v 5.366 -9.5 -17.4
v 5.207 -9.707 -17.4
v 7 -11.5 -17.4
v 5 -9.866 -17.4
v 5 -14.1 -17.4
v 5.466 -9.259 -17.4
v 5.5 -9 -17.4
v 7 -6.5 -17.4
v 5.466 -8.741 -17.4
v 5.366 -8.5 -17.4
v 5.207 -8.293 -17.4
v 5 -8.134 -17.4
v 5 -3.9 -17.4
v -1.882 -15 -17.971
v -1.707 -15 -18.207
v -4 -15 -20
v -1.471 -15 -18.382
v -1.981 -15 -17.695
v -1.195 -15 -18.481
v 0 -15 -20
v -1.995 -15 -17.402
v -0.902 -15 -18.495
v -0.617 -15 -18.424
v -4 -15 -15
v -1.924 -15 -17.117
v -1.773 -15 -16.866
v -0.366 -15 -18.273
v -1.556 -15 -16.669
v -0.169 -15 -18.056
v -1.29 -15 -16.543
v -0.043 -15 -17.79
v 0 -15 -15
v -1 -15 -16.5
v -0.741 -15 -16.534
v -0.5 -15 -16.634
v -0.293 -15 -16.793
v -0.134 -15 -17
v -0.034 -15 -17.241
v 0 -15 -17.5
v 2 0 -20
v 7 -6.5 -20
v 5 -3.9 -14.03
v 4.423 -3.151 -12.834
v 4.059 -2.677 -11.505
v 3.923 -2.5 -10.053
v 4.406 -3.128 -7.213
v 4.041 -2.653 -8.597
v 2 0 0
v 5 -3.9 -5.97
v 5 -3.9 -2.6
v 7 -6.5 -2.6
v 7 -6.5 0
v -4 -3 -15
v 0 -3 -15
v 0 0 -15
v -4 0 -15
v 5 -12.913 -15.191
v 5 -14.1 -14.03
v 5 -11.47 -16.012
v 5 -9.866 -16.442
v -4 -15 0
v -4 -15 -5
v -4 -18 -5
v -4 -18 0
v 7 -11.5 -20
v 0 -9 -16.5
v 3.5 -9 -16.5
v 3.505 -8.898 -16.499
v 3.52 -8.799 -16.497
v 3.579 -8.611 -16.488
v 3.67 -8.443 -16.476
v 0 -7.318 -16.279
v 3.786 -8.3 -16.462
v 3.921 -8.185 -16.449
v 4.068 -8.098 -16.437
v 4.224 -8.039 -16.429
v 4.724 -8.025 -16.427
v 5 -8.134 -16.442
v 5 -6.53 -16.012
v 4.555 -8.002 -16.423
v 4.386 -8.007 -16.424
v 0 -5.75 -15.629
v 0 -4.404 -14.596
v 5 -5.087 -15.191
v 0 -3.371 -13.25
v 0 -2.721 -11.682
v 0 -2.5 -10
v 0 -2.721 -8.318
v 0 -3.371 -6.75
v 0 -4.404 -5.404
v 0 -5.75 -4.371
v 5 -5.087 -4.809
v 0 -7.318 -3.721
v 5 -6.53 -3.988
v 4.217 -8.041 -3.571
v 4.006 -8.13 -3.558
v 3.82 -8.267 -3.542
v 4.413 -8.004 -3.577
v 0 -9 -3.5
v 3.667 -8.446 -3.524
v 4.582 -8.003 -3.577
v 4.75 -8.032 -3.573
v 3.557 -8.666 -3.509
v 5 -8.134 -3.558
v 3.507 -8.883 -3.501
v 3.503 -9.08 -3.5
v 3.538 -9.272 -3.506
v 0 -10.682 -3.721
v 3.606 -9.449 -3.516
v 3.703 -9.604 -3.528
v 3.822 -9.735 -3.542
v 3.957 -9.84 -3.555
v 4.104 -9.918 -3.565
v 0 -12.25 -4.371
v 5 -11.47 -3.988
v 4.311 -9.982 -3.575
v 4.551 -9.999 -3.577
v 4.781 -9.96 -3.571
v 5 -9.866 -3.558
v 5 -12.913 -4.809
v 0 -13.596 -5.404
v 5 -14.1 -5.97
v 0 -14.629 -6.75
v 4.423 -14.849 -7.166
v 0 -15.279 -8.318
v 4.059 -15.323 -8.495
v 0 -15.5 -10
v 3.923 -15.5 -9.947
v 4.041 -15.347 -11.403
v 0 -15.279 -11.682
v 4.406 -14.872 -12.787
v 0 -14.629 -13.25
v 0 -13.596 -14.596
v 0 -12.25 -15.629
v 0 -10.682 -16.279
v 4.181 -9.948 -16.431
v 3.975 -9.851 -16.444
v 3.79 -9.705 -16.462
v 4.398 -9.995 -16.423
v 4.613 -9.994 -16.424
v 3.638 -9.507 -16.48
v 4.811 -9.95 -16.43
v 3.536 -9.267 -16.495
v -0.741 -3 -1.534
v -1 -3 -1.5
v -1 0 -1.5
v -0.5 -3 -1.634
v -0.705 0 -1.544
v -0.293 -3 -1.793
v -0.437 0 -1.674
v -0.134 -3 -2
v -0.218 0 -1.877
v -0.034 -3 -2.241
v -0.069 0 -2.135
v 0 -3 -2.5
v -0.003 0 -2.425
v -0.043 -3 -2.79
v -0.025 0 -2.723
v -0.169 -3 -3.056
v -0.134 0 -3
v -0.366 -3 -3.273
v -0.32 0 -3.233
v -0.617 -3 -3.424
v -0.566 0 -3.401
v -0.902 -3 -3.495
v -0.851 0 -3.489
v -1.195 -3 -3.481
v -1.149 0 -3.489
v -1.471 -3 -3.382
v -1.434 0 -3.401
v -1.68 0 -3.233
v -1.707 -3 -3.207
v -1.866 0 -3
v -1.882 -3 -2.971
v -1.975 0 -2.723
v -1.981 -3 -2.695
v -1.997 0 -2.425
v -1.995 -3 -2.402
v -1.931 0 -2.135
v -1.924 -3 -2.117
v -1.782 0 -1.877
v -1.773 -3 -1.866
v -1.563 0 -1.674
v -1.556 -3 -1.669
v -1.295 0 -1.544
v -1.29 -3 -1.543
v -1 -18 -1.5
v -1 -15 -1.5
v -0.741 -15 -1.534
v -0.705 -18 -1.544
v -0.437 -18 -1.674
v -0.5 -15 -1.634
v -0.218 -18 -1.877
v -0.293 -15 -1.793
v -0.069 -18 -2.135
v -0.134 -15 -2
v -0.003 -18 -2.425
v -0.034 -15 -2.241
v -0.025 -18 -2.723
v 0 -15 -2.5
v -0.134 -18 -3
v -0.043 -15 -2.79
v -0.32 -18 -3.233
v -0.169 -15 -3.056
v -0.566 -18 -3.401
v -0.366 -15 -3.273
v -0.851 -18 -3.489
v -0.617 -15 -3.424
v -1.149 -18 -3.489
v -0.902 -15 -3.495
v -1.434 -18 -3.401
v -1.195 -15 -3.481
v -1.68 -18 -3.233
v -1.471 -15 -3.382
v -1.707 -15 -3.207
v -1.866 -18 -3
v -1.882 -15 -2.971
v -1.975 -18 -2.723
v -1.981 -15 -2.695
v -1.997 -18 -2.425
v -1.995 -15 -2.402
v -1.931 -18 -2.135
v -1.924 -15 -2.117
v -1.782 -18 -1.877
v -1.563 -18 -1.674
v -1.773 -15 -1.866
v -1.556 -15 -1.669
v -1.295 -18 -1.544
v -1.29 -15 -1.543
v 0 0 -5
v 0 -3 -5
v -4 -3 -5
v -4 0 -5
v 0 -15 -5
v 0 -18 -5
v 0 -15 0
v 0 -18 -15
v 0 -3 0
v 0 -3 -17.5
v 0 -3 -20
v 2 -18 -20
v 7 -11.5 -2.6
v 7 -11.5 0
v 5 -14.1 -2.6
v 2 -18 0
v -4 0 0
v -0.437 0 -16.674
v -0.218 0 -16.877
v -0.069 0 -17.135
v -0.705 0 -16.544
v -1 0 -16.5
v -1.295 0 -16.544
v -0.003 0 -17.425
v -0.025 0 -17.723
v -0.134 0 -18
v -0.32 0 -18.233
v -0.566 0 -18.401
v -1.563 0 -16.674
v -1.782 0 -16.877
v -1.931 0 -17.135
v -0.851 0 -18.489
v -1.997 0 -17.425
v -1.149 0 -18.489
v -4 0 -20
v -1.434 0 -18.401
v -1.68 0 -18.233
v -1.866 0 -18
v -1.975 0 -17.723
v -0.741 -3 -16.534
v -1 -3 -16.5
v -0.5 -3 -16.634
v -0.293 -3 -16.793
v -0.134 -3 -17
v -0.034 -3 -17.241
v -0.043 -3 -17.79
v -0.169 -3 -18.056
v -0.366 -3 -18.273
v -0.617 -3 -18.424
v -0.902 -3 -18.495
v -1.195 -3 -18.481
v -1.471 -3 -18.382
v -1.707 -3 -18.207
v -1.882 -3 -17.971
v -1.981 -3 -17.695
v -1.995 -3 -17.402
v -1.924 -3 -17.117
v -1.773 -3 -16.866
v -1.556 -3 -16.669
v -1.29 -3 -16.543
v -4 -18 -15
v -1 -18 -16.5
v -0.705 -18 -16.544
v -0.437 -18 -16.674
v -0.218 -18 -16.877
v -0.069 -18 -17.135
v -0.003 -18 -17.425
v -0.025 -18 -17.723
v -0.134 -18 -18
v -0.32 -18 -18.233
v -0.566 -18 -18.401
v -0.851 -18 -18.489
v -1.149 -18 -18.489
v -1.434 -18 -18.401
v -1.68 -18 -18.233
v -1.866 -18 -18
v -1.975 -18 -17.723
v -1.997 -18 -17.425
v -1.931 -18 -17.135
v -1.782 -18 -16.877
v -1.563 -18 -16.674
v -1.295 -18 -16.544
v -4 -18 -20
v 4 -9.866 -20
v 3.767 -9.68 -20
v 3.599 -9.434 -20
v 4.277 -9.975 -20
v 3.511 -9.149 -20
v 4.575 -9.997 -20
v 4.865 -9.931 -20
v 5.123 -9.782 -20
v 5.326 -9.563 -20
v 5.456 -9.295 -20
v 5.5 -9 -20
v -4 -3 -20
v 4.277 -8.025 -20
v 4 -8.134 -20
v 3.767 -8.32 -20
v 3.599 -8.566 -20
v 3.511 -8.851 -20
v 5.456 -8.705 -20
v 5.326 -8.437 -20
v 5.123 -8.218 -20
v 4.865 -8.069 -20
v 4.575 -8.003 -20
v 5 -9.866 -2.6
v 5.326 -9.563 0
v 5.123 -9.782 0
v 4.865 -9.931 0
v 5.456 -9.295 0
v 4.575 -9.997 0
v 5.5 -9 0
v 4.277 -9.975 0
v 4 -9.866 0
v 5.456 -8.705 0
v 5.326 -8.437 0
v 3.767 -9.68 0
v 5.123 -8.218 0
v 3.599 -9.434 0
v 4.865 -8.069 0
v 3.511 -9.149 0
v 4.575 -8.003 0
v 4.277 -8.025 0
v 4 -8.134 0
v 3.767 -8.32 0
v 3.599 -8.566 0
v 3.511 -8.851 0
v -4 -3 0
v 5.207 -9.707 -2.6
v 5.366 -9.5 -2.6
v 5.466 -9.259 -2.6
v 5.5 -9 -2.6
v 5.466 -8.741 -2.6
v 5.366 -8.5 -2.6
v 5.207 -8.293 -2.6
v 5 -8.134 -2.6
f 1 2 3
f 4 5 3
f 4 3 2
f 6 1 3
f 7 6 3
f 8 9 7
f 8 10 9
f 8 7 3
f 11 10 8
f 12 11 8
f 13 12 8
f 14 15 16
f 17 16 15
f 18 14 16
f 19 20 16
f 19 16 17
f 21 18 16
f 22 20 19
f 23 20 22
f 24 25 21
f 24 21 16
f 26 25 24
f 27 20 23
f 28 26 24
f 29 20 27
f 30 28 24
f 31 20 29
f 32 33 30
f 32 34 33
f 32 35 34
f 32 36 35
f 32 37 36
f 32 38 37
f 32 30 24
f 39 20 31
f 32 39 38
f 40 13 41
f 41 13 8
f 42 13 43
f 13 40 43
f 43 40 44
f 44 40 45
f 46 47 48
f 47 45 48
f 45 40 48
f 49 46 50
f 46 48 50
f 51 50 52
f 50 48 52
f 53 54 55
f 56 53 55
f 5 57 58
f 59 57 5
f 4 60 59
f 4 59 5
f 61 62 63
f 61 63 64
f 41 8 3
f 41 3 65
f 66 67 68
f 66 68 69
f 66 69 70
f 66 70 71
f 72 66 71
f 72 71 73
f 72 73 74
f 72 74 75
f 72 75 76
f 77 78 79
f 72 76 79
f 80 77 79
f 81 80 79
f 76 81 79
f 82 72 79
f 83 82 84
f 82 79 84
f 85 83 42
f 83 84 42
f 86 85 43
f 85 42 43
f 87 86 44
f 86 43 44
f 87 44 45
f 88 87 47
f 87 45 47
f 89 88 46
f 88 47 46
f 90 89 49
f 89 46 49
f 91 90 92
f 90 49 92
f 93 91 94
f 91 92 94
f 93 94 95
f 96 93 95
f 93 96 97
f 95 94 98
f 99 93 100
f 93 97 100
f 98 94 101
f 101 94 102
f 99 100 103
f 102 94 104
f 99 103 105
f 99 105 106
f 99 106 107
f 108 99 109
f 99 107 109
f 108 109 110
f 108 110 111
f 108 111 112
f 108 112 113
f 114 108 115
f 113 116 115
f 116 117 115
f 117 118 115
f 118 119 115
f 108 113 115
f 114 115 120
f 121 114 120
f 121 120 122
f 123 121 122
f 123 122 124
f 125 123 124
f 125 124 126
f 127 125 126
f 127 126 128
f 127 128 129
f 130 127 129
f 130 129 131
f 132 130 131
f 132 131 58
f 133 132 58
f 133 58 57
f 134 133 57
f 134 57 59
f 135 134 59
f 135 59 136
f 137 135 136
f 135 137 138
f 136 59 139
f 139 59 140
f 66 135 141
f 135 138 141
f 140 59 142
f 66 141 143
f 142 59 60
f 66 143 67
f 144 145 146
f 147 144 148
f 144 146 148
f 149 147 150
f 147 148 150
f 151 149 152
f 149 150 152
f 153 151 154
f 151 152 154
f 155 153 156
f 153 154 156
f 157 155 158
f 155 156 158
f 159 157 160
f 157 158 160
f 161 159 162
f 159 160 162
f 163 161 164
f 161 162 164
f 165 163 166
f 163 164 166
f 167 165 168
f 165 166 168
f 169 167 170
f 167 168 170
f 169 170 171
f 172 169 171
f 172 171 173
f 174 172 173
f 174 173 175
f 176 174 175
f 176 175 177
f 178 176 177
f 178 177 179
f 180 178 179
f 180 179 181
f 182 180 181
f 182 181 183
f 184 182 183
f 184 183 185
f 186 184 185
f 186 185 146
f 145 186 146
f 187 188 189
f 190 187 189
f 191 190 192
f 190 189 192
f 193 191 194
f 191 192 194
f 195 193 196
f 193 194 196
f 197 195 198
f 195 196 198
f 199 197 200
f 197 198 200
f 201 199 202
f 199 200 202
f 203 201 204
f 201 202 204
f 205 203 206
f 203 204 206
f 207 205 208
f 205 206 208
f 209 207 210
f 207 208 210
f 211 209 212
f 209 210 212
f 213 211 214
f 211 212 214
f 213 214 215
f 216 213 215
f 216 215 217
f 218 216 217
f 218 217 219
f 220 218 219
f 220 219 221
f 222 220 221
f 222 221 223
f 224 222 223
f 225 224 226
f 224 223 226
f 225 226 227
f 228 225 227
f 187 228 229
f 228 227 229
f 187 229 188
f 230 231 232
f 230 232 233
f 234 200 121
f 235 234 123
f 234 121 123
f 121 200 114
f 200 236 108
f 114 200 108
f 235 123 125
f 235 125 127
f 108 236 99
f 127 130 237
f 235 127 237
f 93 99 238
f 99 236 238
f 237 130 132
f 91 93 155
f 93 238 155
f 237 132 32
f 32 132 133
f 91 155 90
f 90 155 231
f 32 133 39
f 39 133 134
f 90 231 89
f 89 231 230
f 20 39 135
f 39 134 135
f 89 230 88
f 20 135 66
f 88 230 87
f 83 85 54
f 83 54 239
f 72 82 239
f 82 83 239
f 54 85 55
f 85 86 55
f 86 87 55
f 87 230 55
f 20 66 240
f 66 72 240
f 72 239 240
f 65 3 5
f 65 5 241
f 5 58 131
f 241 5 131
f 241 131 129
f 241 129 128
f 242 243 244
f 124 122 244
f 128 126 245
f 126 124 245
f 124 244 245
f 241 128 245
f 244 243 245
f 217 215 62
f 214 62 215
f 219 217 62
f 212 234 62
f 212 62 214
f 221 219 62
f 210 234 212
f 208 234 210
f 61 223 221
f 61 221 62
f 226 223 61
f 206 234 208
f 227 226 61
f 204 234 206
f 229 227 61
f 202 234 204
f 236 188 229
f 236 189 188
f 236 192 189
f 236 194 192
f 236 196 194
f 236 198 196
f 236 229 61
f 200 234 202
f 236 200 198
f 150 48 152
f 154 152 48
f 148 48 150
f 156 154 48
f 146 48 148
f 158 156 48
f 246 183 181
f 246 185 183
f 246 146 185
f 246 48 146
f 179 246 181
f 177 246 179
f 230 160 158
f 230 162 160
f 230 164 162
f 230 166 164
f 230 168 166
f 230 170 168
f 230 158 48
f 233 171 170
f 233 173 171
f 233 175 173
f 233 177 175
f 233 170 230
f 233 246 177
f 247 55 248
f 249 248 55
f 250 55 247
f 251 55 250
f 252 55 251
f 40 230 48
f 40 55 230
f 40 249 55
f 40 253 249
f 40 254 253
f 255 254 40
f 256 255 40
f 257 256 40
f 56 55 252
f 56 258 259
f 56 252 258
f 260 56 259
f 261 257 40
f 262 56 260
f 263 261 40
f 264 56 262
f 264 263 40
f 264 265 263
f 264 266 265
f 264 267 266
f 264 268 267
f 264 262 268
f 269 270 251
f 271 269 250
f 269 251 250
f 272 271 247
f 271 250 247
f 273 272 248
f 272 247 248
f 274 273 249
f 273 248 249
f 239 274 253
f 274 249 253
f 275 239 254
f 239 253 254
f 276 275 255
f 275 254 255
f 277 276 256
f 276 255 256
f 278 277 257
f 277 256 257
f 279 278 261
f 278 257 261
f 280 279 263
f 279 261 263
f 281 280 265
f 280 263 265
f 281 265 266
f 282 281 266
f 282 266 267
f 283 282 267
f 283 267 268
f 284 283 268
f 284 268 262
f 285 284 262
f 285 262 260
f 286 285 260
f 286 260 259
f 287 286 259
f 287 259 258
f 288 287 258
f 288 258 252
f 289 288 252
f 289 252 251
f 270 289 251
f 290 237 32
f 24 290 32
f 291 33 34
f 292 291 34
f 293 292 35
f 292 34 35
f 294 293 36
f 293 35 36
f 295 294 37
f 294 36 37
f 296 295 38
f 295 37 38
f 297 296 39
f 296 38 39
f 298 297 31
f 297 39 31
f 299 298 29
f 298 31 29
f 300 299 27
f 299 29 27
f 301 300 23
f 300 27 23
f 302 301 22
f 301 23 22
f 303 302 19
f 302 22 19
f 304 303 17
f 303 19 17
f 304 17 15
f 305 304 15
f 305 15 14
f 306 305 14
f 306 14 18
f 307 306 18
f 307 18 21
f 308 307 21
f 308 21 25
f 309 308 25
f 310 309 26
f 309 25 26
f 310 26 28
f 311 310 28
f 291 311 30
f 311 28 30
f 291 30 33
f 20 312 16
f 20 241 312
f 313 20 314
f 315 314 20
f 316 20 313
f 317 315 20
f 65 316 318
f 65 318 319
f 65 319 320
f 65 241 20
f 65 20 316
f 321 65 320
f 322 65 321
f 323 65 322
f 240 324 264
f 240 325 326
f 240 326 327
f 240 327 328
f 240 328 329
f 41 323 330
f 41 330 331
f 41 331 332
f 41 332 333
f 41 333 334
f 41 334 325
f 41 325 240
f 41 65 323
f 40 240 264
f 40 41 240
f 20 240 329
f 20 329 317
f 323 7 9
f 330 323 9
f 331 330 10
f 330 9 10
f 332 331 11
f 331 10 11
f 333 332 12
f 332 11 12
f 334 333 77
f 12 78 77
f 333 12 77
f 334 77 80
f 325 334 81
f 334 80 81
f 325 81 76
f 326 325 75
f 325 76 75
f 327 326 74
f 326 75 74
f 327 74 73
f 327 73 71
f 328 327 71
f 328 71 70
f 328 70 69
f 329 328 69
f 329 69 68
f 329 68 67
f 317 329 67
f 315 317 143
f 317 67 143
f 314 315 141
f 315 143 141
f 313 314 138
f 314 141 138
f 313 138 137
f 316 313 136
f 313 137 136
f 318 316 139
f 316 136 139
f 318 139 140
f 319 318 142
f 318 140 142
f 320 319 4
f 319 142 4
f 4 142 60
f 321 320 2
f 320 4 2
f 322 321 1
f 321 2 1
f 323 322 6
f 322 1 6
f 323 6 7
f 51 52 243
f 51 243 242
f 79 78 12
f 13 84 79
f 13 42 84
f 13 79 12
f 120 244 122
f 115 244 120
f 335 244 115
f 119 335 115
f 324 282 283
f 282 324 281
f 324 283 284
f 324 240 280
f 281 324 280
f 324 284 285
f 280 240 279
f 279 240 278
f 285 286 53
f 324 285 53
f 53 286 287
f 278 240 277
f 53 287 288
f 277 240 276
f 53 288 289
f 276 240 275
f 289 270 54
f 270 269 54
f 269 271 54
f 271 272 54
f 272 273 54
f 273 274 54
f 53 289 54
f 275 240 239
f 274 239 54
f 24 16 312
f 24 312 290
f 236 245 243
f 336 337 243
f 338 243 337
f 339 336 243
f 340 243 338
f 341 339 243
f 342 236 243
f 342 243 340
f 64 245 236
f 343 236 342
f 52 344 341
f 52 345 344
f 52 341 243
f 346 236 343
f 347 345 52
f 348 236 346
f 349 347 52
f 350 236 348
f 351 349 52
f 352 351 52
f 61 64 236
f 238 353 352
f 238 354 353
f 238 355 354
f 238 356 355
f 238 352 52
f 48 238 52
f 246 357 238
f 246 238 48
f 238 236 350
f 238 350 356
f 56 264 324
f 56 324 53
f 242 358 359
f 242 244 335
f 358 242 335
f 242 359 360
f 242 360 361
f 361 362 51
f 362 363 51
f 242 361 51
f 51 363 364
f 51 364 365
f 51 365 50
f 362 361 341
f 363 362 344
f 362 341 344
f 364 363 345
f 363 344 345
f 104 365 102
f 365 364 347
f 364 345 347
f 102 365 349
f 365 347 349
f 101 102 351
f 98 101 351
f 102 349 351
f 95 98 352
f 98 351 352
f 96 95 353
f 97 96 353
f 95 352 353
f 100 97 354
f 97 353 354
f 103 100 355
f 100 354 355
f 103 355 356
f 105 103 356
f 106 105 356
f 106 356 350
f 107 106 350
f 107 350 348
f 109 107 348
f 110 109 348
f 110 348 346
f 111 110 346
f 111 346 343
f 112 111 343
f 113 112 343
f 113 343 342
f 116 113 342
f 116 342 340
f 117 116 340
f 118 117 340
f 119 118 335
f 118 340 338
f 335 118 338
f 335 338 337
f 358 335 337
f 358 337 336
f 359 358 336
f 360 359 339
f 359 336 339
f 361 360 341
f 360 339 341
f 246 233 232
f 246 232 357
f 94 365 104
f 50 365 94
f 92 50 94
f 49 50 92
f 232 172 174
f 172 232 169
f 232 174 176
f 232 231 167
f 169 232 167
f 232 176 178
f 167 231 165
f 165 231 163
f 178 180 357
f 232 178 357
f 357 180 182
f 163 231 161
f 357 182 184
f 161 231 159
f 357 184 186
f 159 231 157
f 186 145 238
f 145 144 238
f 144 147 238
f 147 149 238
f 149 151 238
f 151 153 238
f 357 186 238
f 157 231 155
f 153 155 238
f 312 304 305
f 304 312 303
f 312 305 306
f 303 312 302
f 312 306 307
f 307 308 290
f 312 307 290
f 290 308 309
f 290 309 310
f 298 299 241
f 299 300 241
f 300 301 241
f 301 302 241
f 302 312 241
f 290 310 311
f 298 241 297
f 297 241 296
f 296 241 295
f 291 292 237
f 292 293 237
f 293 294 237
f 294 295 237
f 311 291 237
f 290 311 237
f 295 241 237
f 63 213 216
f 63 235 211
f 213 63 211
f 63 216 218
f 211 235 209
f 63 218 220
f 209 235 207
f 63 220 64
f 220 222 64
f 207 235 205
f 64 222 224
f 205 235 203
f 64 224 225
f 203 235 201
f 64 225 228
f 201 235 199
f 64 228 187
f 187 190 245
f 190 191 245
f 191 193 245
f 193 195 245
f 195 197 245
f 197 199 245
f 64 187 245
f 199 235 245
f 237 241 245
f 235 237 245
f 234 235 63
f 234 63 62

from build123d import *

# Parameters (mm, degrees)
SKETCH_1_W          = 20
SKETCH_1_H          = 18
EXTRUDE_1_DEPTH     = 5
SKETCH_2_R          = 6.5
CUT_EXTRUDE_1_DEPTH = 28.367864367
SKETCH_3_W          = 2.6
SKETCH_3_H          = 18
EXTRUDE_2_DEPTH     = 2
SKETCH_4_R          = 1
CUT_EXTRUDE_2_DEPTH = 28.802877549
CUT_EXTRUDE_3_DEPTH = 28.802877621
SKETCH_6_W          = 5
SKETCH_6_H          = 3
EXTRUDE_3_DEPTH     = 4
SKETCH_7_R          = 1
CUT_EXTRUDE_4_DEPTH = 28.802877621


with BuildPart() as part:
    # 草图1 → 凸台-拉伸1 (new body)
    with BuildSketch(Plane(origin=(0, 0, 0), x_dir=(0, 0, -1), z_dir=(1, 0, 0))):
        with Locations((10, -9)):
            Rectangle(SKETCH_1_W, SKETCH_1_H)
    extrude(amount=EXTRUDE_1_DEPTH)

    # 草图2 → 切除-拉伸1 (cut, through all)
    with BuildSketch(Plane(origin=(5, 0, 0), x_dir=(0, 0, -1), z_dir=(1, 0, 0))):
        with Locations((10, -9)):
            Circle(SKETCH_2_R)
    extrude(amount=-CUT_EXTRUDE_1_DEPTH, mode=Mode.SUBTRACT)

    # 草图3 → 凸台-拉伸2 (add)
    with BuildSketch(Plane(origin=(5, 0, 0), x_dir=(0, 0, -1), z_dir=(1, 0, 0))):
        with Locations((1.3, -9)):
            Rectangle(SKETCH_3_W, SKETCH_3_H)
        with Locations((18.7, -9)):
            Rectangle(SKETCH_3_W, SKETCH_3_H)
    extrude(amount=EXTRUDE_2_DEPTH)

    # 草图4 → 切除-拉伸2 (cut, through all)
    with BuildSketch(Plane.XY):
        with Locations((4.5, -9)):
            Circle(SKETCH_4_R)
    extrude(amount=-CUT_EXTRUDE_2_DEPTH, mode=Mode.SUBTRACT)

    # 草图5 → 切除-拉伸3 (cut, through all)
    with BuildSketch(Plane.XY):
        Polygon((7, 0), (2, 0), (7, -6.5), align=None)
        Polygon((7, -18), (7, -11.5), (2, -18), align=None)
    extrude(amount=-CUT_EXTRUDE_3_DEPTH, mode=Mode.SUBTRACT)

    # 草图6 → 凸台-拉伸3 (add)
    with BuildSketch(Plane.ZY):
        with Locations((-17.5, -16.5)):
            Rectangle(SKETCH_6_W, SKETCH_6_H)
        with Locations((-17.5, -1.5)):
            Rectangle(SKETCH_6_W, SKETCH_6_H)
        with Locations((-2.5, -1.5)):
            Rectangle(SKETCH_6_W, SKETCH_6_H)
        with Locations((-2.5, -16.5)):
            Rectangle(SKETCH_6_W, SKETCH_6_H)
    extrude(amount=EXTRUDE_3_DEPTH)

    # 草图7 → 切除-拉伸4 (cut, through all)
    with BuildSketch(Plane(origin=(0, 0, 0), x_dir=(1, 0, 0), z_dir=(0, 1, 0))):
        with Locations(Location((-1, 17.5, 0), (0, 0, 270))):
            Circle(SKETCH_7_R)
        with Locations(Location((-1, 2.5, 0), (0, 0, 270))):
            Circle(SKETCH_7_R)
    extrude(amount=-CUT_EXTRUDE_4_DEPTH, mode=Mode.SUBTRACT)


solid = part.part
